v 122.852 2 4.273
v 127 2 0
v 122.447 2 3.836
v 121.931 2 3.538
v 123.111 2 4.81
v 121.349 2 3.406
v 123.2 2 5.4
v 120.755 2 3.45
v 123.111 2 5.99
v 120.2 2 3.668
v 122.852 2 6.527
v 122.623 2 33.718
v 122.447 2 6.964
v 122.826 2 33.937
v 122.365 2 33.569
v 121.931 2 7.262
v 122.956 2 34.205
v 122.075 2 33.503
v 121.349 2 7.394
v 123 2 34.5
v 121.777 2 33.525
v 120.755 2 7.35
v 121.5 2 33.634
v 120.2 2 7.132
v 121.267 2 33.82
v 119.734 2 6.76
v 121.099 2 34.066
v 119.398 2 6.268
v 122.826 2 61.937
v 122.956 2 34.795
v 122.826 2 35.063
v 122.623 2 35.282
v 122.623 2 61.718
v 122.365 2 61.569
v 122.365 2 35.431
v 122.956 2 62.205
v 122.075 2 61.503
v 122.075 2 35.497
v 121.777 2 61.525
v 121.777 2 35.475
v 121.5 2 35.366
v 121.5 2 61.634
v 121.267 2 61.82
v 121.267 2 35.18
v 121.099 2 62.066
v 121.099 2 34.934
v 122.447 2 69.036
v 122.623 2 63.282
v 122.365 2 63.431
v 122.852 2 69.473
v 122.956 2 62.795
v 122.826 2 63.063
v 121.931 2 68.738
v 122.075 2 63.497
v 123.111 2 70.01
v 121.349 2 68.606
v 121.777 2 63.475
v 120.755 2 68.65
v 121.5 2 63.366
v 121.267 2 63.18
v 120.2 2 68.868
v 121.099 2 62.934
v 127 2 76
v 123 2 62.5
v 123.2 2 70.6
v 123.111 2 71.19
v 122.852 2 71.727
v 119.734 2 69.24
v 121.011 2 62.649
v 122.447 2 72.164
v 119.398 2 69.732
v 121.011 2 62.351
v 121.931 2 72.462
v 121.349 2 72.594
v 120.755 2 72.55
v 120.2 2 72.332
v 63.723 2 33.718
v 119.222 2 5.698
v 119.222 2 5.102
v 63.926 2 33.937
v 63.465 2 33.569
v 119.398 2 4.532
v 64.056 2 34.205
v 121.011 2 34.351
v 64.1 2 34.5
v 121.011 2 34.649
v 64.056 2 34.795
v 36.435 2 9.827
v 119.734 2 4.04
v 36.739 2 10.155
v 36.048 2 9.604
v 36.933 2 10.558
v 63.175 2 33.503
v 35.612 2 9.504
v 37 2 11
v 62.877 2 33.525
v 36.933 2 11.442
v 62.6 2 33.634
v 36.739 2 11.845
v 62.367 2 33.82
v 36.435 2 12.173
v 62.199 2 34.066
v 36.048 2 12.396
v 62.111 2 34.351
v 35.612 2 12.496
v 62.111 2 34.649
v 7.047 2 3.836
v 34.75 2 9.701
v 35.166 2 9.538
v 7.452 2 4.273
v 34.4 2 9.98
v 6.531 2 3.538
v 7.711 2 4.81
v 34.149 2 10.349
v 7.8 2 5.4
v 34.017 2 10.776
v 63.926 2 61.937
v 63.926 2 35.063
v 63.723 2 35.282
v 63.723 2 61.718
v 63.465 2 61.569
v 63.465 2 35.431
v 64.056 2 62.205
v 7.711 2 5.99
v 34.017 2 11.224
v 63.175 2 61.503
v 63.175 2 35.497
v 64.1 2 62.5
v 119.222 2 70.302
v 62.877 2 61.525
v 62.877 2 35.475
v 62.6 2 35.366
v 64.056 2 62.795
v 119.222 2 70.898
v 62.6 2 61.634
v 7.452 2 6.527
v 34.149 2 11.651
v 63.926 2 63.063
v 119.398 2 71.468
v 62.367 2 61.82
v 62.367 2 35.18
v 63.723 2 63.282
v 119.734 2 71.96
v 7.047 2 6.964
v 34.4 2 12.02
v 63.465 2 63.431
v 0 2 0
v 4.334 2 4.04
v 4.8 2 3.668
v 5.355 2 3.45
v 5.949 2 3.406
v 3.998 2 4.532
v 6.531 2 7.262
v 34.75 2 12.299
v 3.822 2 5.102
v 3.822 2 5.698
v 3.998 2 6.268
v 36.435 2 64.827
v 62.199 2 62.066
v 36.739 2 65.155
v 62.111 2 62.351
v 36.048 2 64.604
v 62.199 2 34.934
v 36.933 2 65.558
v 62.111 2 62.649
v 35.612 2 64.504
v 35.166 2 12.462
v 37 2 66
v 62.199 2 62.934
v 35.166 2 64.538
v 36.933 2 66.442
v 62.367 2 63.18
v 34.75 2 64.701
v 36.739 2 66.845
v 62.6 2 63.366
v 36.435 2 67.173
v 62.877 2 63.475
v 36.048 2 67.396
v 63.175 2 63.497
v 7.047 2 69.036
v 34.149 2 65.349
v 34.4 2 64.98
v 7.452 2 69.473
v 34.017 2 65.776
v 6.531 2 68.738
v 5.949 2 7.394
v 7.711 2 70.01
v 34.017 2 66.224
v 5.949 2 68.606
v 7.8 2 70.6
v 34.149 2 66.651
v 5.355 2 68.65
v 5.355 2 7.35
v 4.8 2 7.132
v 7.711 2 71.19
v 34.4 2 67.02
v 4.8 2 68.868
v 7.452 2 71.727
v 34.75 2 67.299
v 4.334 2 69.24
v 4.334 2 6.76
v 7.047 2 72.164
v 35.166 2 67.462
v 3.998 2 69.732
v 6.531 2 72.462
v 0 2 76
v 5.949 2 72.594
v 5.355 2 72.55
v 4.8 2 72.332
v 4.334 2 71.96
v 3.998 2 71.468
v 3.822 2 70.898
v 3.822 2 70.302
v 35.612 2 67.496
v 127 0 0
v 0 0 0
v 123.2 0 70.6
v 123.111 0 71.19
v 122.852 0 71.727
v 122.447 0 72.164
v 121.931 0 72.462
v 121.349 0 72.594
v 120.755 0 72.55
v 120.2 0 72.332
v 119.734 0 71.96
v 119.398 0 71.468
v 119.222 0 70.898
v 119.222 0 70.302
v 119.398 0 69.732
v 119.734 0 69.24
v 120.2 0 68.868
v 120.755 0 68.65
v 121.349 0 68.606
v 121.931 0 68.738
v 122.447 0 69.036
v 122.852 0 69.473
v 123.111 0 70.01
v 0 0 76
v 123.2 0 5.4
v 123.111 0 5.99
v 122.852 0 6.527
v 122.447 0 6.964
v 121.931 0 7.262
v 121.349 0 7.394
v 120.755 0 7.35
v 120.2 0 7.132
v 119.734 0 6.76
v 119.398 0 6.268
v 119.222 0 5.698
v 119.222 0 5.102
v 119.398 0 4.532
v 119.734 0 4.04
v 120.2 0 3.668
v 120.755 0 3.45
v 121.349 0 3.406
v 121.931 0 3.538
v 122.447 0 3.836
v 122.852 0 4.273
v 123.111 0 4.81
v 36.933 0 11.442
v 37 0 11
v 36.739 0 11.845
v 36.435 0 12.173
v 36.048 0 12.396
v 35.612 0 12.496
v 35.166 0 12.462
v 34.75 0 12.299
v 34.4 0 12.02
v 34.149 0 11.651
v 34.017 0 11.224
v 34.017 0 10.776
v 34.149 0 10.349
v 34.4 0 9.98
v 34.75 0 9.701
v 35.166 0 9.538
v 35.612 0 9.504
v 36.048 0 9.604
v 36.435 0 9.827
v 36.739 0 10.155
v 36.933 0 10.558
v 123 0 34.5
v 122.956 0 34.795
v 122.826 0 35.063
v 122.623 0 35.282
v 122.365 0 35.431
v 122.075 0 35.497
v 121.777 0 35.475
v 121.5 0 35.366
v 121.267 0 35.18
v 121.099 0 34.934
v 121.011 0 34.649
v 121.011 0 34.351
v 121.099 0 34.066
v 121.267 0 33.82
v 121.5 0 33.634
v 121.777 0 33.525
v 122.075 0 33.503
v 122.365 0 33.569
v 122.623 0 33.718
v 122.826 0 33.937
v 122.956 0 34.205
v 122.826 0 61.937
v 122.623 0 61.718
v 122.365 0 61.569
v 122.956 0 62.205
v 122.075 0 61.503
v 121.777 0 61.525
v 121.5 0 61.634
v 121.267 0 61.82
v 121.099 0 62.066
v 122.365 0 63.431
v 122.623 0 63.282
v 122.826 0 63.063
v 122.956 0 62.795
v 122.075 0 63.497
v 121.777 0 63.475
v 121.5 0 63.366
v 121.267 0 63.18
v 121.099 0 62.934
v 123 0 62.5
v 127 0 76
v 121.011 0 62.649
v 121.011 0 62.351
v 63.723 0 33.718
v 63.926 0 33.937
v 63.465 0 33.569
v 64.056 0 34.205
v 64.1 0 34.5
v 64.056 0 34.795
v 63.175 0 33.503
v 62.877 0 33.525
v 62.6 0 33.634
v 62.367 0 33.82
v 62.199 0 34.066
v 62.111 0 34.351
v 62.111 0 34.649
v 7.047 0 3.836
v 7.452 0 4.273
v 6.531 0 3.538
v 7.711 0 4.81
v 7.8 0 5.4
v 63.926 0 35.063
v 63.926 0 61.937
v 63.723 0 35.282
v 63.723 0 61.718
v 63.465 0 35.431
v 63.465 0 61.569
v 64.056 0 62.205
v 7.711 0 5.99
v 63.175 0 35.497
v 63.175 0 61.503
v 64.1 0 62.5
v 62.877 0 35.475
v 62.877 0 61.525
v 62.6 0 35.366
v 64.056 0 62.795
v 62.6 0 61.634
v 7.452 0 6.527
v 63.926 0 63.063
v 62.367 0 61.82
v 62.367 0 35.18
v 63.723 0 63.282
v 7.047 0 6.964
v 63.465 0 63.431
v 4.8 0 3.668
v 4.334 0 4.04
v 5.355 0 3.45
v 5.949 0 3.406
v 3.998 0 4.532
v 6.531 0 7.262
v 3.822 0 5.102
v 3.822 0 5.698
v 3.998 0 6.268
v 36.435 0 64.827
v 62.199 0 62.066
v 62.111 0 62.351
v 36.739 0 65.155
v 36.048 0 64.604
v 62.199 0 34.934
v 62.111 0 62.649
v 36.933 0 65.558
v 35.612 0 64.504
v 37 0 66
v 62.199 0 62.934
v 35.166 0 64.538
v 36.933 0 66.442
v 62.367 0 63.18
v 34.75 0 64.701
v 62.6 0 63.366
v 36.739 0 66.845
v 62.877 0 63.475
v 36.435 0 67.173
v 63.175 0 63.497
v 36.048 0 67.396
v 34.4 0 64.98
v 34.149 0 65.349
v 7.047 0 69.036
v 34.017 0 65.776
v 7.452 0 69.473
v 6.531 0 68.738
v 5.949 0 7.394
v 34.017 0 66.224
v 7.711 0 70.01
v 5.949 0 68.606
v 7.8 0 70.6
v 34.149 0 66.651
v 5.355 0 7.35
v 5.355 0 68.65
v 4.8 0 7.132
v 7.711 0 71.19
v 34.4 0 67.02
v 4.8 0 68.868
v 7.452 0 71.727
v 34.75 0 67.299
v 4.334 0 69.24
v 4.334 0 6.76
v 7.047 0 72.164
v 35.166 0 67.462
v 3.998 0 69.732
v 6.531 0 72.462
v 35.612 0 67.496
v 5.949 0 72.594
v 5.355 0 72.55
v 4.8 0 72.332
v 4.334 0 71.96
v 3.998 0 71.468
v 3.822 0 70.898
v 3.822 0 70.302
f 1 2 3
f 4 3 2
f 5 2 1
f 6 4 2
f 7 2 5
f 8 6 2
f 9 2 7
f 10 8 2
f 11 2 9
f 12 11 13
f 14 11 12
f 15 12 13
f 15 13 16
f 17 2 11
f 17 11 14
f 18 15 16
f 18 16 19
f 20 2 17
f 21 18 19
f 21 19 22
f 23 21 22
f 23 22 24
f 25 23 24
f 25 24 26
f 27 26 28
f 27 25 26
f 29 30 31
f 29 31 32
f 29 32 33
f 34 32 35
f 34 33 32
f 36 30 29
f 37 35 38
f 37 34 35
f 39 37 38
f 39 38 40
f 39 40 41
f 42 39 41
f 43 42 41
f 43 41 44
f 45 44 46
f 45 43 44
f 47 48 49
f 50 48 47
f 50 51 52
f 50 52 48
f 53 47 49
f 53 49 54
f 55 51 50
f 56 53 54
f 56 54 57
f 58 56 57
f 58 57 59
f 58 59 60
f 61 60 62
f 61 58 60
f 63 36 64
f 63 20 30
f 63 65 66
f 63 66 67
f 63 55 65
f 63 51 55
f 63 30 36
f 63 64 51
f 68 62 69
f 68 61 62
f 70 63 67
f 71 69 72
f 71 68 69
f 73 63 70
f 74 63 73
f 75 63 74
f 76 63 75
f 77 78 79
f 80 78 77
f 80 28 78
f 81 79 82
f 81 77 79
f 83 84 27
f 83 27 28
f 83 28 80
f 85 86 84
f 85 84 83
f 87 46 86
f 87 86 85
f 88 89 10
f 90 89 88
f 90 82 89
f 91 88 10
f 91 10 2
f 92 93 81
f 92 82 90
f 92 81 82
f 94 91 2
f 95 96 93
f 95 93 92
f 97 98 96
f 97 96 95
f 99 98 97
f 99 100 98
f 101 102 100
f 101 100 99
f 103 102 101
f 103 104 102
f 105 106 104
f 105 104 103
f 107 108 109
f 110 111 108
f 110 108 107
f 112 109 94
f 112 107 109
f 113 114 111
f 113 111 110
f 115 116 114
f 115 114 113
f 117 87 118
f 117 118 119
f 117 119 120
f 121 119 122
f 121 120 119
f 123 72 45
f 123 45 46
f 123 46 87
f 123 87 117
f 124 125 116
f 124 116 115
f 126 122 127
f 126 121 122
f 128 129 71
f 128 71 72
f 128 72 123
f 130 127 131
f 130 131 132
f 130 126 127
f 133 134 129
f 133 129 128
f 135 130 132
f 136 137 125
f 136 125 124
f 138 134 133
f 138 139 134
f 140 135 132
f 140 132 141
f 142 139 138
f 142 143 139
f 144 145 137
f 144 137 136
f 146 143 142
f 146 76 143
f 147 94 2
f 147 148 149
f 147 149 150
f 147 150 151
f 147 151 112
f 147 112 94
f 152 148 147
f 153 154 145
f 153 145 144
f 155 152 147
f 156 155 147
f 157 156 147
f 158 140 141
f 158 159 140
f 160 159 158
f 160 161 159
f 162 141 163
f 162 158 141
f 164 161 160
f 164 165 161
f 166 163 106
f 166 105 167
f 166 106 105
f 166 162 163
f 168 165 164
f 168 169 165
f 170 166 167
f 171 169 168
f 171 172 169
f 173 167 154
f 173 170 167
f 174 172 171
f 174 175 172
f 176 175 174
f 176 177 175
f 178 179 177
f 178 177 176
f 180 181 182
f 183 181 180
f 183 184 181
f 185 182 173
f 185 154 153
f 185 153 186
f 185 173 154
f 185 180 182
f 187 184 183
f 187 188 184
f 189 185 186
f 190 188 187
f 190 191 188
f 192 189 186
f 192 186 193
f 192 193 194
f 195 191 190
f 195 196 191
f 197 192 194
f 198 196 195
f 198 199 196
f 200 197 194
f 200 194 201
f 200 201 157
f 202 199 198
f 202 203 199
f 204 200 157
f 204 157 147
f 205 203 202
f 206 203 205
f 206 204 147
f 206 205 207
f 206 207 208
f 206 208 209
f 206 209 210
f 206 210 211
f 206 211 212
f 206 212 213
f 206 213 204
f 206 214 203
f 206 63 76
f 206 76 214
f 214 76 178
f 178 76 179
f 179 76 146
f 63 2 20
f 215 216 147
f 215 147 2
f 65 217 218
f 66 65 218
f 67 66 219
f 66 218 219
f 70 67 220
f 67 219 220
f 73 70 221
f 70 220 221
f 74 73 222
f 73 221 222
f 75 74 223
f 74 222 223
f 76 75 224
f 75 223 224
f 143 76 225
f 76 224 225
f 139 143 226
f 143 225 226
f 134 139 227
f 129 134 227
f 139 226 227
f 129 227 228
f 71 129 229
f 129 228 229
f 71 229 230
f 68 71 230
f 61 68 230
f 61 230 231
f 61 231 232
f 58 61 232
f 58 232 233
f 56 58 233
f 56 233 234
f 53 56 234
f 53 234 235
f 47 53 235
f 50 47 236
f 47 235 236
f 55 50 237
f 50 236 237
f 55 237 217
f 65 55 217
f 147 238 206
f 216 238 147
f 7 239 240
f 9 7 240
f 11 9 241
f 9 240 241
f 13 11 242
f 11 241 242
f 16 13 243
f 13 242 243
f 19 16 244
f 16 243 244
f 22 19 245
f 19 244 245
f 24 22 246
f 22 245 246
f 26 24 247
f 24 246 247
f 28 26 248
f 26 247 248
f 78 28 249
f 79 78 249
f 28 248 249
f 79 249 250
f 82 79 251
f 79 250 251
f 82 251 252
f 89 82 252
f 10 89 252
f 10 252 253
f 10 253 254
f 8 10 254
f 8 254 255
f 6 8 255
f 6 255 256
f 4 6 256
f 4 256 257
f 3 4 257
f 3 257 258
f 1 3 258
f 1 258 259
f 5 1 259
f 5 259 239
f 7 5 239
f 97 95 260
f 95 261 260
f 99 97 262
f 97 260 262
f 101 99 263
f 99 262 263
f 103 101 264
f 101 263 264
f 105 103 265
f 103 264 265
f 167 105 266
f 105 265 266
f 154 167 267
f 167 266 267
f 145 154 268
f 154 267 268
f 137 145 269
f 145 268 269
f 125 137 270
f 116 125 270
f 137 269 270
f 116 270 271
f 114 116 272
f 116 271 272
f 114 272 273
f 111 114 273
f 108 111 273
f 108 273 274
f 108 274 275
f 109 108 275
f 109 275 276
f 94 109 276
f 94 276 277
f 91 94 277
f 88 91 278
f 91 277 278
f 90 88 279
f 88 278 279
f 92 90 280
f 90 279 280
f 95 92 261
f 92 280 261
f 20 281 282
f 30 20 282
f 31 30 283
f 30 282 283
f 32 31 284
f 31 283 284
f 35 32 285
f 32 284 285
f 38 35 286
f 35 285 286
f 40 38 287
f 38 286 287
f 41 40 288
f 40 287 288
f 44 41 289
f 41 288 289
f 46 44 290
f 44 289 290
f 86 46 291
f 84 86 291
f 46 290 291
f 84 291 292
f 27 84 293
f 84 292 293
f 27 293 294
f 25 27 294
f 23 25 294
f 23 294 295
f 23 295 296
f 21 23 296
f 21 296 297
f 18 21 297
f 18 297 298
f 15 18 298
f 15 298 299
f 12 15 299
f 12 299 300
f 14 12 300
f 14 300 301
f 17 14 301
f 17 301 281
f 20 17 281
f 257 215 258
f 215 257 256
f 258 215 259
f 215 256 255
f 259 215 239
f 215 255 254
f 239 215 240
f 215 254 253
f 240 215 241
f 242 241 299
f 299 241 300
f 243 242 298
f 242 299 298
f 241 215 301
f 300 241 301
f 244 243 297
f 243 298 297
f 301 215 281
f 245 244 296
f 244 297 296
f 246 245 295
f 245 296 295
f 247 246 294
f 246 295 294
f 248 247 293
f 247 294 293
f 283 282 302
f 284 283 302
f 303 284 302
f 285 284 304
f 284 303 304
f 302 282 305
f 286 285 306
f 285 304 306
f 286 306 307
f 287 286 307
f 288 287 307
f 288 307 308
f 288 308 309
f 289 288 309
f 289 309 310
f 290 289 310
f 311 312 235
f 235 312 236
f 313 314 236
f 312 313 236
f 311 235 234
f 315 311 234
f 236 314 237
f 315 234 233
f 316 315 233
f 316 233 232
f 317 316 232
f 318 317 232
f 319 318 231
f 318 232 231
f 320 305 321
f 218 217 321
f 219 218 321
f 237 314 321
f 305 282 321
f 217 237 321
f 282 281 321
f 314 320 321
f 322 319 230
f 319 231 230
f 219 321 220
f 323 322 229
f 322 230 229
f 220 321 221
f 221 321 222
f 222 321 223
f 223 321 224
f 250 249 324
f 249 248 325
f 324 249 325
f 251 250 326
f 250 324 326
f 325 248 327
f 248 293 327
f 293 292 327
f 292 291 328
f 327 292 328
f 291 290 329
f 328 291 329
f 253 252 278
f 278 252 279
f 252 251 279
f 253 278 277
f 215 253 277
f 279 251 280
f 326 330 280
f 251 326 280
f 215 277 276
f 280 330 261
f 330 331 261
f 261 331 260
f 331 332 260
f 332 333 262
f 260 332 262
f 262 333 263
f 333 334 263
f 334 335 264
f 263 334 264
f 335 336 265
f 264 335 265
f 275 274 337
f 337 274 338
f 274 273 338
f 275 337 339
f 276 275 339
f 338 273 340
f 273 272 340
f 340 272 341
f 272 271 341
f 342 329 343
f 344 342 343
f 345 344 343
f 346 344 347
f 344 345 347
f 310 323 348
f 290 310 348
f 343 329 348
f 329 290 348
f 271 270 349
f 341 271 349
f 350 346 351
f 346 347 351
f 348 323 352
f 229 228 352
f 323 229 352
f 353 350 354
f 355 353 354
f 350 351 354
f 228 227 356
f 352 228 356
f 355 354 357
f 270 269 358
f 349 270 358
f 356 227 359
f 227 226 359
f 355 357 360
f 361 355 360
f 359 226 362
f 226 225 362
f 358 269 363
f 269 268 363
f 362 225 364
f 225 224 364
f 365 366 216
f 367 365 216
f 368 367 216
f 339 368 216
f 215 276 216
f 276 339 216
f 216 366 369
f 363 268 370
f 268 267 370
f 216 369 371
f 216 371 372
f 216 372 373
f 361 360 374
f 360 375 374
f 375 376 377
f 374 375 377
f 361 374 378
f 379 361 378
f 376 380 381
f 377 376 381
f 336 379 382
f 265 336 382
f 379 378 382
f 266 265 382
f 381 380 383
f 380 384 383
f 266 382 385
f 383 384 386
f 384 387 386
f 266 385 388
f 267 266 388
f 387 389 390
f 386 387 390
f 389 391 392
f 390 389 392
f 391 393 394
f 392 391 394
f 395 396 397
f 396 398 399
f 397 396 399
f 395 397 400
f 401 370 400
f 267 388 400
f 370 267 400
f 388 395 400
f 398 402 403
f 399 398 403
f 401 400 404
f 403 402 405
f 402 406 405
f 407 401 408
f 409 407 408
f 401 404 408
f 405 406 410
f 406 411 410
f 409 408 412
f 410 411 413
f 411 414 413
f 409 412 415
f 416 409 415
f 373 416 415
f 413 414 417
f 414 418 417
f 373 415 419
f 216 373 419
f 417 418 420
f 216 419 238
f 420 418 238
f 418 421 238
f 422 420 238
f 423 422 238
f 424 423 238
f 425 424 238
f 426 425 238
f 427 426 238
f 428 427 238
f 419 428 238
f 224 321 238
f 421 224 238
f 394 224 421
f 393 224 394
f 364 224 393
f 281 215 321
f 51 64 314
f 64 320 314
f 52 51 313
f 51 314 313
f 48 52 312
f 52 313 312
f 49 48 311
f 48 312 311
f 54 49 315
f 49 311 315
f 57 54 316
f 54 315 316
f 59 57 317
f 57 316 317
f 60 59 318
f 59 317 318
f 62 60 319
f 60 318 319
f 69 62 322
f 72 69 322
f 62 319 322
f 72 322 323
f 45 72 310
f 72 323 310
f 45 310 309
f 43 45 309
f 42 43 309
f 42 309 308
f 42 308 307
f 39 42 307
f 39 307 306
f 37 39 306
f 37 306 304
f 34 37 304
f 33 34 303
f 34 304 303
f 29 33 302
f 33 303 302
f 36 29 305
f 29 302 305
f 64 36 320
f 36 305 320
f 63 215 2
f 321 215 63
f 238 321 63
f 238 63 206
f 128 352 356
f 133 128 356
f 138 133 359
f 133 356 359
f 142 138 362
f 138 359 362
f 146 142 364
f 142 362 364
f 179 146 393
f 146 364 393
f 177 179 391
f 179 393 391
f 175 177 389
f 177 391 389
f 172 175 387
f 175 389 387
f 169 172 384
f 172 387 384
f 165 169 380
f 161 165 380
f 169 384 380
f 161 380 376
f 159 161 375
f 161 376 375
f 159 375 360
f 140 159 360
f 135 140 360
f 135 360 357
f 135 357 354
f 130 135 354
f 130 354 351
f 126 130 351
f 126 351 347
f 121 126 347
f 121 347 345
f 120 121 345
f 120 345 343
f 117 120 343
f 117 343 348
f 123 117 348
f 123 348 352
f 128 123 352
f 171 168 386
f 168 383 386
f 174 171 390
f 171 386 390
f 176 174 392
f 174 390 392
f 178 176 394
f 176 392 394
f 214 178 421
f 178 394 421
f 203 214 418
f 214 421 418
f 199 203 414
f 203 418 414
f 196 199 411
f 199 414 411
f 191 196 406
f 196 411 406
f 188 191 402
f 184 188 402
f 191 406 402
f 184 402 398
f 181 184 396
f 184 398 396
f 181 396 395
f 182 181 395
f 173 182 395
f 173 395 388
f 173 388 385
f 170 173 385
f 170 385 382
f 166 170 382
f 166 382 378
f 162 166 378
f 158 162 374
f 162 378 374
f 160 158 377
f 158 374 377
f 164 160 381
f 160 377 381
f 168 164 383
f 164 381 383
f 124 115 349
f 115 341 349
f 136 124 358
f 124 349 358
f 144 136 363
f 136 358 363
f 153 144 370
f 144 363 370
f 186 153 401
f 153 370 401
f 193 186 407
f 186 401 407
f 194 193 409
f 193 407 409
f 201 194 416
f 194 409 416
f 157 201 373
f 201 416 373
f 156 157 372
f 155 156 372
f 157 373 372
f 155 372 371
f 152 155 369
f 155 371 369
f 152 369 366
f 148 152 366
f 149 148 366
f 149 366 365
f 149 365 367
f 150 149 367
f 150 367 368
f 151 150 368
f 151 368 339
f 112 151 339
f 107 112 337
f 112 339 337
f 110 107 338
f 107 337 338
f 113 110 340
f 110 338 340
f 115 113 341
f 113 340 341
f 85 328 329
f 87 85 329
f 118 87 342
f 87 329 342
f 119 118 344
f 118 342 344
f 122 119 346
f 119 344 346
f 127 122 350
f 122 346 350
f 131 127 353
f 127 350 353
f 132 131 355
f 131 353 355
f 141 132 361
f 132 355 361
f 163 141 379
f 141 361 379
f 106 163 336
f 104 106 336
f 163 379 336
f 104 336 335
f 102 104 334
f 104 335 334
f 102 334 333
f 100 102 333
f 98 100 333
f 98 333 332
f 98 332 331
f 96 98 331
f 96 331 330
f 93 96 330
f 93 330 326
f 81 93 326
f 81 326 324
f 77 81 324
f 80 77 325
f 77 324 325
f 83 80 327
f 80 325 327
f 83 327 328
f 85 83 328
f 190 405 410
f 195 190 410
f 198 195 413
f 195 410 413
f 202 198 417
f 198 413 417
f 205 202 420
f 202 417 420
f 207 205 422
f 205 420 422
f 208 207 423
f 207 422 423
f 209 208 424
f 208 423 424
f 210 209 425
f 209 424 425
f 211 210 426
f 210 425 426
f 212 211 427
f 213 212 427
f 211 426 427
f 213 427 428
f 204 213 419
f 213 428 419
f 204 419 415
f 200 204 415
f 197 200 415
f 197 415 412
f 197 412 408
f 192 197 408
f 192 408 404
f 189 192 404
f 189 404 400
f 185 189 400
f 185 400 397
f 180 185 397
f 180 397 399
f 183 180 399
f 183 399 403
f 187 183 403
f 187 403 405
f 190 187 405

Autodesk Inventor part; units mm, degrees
ref_plane "YZ Plane" through (0, 0, 0) normal (1, 0, 0) x (0, 1, 0)
ref_plane "XZ Plane" through (0, 0, 0) normal (0, 1, 0) x (-1, 0, 0)
ref_plane "XY Plane" through (0, 0, 0) normal (0, 0, 1) x (1, 0, 0)
sketch "Sketch1" plane through (0, 0, 0) normal (0, 1, 0) x (-1, 0, 0)
  line L0 (0, 0) -> (-127, 0)
  line L1 (-127, 0) -> (-127, 76)
  line L2 (-127, 76) -> (0, 76)
  line L3 (0, 76) -> (0, 0)
  dimension "d0" = 76
  dimension "d1" = 127
extrude "Extrusion1" add sketch "Sketch1" along normal blind 2
sketch "Sketch2" plane through (0, 0, 0) normal (0, -1, 0) x (1, 0, 0)
  line L0 (0, 0) -> (127, 0) projected
  line L1 (127, 0) -> (127, 76) projected
  line L2 (127, 76) -> (0, 76) projected
  line L3 (0, 76) -> (0, 0) projected
  line L4 (0, 5.4) -> (127, 5.4) construction
  line L5 (0, 38) -> (127, 38) construction
  line L6 (63.5, 76) -> (63.5, 0) construction
  line L7 (121.2, 76) -> (121.2, 0) construction
  line L8 (0, 70.6) -> (127, 70.6) construction
  line L9 (5.8, 76) -> (5.8, 0) construction
  circle A0 centre (121.2, 70.6) radius 2
  circle A1 centre (121.2, 5.4) radius 2
  circle A2 centre (5.8, 70.6) radius 2
  circle A3 centre (5.8, 5.4) radius 2
  dimension "d5" = 32.6
  dimension "d6" = 57.7
  dimension "d7" = 4
extrude "Extrusion2" cut sketch "Sketch2" against normal through all contours A0 | A1 | A2 | A3
sketch "Sketch3" plane through (0, 0, 0) normal (0, -1, 0) x (1, 0, 0)
  line L0 (0, 0) -> (127, 0) projected
  line L1 (0, 76) -> (0, 0) projected
  line L2 (10, 93) -> (61, 93)
  line L3 (61, 93) -> (61, 0)
  line L4 (61, 0) -> (10, 0)
  line L5 (10, 0) -> (10, 93)
  line L6 (61, 32) -> (124, 32)
  line L7 (124, 32) -> (124, 67)
  line L8 (124, 67) -> (61, 67)
  line L9 (61, 67) -> (61, 32)
  line L10 (35.5, 93) -> (35.5, 0) construction
  circle A0 centre (35.5, 11) radius 1.5
  circle A1 centre (35.5, 66) radius 1.5
  line L11 (92.5, 67) -> (92.5, 32) construction
  line L12 (124, 49.5) -> (61, 49.5) construction
  circle A2 centre (122, 34.5) radius 1
  circle A3 centre (122, 62.5) radius 1
  circle A4 centre (63.1, 34.5) radius 1
  circle A5 centre (63.1, 62.5) radius 1
  dimension "d10" = 93
  dimension "d12" = 51
  dimension "d13" = 10
  dimension "d14" = 63
  dimension "d15" = 35
  dimension "d16" = 11
  dimension "d17" = 3
  dimension "d20" = 55
  dimension "d25" = 32
  dimension "d26" = 29.5
  dimension "d27" = 2
  dimension "d28" = 15
  dimension "d31" = 28
  dimension "d34" = 58.9
extrude "Extrusion3" cut sketch "Sketch3" against normal through all contours A0 | A1 | A2 | A3 | A4 | A5
properties part number "base_ps"
